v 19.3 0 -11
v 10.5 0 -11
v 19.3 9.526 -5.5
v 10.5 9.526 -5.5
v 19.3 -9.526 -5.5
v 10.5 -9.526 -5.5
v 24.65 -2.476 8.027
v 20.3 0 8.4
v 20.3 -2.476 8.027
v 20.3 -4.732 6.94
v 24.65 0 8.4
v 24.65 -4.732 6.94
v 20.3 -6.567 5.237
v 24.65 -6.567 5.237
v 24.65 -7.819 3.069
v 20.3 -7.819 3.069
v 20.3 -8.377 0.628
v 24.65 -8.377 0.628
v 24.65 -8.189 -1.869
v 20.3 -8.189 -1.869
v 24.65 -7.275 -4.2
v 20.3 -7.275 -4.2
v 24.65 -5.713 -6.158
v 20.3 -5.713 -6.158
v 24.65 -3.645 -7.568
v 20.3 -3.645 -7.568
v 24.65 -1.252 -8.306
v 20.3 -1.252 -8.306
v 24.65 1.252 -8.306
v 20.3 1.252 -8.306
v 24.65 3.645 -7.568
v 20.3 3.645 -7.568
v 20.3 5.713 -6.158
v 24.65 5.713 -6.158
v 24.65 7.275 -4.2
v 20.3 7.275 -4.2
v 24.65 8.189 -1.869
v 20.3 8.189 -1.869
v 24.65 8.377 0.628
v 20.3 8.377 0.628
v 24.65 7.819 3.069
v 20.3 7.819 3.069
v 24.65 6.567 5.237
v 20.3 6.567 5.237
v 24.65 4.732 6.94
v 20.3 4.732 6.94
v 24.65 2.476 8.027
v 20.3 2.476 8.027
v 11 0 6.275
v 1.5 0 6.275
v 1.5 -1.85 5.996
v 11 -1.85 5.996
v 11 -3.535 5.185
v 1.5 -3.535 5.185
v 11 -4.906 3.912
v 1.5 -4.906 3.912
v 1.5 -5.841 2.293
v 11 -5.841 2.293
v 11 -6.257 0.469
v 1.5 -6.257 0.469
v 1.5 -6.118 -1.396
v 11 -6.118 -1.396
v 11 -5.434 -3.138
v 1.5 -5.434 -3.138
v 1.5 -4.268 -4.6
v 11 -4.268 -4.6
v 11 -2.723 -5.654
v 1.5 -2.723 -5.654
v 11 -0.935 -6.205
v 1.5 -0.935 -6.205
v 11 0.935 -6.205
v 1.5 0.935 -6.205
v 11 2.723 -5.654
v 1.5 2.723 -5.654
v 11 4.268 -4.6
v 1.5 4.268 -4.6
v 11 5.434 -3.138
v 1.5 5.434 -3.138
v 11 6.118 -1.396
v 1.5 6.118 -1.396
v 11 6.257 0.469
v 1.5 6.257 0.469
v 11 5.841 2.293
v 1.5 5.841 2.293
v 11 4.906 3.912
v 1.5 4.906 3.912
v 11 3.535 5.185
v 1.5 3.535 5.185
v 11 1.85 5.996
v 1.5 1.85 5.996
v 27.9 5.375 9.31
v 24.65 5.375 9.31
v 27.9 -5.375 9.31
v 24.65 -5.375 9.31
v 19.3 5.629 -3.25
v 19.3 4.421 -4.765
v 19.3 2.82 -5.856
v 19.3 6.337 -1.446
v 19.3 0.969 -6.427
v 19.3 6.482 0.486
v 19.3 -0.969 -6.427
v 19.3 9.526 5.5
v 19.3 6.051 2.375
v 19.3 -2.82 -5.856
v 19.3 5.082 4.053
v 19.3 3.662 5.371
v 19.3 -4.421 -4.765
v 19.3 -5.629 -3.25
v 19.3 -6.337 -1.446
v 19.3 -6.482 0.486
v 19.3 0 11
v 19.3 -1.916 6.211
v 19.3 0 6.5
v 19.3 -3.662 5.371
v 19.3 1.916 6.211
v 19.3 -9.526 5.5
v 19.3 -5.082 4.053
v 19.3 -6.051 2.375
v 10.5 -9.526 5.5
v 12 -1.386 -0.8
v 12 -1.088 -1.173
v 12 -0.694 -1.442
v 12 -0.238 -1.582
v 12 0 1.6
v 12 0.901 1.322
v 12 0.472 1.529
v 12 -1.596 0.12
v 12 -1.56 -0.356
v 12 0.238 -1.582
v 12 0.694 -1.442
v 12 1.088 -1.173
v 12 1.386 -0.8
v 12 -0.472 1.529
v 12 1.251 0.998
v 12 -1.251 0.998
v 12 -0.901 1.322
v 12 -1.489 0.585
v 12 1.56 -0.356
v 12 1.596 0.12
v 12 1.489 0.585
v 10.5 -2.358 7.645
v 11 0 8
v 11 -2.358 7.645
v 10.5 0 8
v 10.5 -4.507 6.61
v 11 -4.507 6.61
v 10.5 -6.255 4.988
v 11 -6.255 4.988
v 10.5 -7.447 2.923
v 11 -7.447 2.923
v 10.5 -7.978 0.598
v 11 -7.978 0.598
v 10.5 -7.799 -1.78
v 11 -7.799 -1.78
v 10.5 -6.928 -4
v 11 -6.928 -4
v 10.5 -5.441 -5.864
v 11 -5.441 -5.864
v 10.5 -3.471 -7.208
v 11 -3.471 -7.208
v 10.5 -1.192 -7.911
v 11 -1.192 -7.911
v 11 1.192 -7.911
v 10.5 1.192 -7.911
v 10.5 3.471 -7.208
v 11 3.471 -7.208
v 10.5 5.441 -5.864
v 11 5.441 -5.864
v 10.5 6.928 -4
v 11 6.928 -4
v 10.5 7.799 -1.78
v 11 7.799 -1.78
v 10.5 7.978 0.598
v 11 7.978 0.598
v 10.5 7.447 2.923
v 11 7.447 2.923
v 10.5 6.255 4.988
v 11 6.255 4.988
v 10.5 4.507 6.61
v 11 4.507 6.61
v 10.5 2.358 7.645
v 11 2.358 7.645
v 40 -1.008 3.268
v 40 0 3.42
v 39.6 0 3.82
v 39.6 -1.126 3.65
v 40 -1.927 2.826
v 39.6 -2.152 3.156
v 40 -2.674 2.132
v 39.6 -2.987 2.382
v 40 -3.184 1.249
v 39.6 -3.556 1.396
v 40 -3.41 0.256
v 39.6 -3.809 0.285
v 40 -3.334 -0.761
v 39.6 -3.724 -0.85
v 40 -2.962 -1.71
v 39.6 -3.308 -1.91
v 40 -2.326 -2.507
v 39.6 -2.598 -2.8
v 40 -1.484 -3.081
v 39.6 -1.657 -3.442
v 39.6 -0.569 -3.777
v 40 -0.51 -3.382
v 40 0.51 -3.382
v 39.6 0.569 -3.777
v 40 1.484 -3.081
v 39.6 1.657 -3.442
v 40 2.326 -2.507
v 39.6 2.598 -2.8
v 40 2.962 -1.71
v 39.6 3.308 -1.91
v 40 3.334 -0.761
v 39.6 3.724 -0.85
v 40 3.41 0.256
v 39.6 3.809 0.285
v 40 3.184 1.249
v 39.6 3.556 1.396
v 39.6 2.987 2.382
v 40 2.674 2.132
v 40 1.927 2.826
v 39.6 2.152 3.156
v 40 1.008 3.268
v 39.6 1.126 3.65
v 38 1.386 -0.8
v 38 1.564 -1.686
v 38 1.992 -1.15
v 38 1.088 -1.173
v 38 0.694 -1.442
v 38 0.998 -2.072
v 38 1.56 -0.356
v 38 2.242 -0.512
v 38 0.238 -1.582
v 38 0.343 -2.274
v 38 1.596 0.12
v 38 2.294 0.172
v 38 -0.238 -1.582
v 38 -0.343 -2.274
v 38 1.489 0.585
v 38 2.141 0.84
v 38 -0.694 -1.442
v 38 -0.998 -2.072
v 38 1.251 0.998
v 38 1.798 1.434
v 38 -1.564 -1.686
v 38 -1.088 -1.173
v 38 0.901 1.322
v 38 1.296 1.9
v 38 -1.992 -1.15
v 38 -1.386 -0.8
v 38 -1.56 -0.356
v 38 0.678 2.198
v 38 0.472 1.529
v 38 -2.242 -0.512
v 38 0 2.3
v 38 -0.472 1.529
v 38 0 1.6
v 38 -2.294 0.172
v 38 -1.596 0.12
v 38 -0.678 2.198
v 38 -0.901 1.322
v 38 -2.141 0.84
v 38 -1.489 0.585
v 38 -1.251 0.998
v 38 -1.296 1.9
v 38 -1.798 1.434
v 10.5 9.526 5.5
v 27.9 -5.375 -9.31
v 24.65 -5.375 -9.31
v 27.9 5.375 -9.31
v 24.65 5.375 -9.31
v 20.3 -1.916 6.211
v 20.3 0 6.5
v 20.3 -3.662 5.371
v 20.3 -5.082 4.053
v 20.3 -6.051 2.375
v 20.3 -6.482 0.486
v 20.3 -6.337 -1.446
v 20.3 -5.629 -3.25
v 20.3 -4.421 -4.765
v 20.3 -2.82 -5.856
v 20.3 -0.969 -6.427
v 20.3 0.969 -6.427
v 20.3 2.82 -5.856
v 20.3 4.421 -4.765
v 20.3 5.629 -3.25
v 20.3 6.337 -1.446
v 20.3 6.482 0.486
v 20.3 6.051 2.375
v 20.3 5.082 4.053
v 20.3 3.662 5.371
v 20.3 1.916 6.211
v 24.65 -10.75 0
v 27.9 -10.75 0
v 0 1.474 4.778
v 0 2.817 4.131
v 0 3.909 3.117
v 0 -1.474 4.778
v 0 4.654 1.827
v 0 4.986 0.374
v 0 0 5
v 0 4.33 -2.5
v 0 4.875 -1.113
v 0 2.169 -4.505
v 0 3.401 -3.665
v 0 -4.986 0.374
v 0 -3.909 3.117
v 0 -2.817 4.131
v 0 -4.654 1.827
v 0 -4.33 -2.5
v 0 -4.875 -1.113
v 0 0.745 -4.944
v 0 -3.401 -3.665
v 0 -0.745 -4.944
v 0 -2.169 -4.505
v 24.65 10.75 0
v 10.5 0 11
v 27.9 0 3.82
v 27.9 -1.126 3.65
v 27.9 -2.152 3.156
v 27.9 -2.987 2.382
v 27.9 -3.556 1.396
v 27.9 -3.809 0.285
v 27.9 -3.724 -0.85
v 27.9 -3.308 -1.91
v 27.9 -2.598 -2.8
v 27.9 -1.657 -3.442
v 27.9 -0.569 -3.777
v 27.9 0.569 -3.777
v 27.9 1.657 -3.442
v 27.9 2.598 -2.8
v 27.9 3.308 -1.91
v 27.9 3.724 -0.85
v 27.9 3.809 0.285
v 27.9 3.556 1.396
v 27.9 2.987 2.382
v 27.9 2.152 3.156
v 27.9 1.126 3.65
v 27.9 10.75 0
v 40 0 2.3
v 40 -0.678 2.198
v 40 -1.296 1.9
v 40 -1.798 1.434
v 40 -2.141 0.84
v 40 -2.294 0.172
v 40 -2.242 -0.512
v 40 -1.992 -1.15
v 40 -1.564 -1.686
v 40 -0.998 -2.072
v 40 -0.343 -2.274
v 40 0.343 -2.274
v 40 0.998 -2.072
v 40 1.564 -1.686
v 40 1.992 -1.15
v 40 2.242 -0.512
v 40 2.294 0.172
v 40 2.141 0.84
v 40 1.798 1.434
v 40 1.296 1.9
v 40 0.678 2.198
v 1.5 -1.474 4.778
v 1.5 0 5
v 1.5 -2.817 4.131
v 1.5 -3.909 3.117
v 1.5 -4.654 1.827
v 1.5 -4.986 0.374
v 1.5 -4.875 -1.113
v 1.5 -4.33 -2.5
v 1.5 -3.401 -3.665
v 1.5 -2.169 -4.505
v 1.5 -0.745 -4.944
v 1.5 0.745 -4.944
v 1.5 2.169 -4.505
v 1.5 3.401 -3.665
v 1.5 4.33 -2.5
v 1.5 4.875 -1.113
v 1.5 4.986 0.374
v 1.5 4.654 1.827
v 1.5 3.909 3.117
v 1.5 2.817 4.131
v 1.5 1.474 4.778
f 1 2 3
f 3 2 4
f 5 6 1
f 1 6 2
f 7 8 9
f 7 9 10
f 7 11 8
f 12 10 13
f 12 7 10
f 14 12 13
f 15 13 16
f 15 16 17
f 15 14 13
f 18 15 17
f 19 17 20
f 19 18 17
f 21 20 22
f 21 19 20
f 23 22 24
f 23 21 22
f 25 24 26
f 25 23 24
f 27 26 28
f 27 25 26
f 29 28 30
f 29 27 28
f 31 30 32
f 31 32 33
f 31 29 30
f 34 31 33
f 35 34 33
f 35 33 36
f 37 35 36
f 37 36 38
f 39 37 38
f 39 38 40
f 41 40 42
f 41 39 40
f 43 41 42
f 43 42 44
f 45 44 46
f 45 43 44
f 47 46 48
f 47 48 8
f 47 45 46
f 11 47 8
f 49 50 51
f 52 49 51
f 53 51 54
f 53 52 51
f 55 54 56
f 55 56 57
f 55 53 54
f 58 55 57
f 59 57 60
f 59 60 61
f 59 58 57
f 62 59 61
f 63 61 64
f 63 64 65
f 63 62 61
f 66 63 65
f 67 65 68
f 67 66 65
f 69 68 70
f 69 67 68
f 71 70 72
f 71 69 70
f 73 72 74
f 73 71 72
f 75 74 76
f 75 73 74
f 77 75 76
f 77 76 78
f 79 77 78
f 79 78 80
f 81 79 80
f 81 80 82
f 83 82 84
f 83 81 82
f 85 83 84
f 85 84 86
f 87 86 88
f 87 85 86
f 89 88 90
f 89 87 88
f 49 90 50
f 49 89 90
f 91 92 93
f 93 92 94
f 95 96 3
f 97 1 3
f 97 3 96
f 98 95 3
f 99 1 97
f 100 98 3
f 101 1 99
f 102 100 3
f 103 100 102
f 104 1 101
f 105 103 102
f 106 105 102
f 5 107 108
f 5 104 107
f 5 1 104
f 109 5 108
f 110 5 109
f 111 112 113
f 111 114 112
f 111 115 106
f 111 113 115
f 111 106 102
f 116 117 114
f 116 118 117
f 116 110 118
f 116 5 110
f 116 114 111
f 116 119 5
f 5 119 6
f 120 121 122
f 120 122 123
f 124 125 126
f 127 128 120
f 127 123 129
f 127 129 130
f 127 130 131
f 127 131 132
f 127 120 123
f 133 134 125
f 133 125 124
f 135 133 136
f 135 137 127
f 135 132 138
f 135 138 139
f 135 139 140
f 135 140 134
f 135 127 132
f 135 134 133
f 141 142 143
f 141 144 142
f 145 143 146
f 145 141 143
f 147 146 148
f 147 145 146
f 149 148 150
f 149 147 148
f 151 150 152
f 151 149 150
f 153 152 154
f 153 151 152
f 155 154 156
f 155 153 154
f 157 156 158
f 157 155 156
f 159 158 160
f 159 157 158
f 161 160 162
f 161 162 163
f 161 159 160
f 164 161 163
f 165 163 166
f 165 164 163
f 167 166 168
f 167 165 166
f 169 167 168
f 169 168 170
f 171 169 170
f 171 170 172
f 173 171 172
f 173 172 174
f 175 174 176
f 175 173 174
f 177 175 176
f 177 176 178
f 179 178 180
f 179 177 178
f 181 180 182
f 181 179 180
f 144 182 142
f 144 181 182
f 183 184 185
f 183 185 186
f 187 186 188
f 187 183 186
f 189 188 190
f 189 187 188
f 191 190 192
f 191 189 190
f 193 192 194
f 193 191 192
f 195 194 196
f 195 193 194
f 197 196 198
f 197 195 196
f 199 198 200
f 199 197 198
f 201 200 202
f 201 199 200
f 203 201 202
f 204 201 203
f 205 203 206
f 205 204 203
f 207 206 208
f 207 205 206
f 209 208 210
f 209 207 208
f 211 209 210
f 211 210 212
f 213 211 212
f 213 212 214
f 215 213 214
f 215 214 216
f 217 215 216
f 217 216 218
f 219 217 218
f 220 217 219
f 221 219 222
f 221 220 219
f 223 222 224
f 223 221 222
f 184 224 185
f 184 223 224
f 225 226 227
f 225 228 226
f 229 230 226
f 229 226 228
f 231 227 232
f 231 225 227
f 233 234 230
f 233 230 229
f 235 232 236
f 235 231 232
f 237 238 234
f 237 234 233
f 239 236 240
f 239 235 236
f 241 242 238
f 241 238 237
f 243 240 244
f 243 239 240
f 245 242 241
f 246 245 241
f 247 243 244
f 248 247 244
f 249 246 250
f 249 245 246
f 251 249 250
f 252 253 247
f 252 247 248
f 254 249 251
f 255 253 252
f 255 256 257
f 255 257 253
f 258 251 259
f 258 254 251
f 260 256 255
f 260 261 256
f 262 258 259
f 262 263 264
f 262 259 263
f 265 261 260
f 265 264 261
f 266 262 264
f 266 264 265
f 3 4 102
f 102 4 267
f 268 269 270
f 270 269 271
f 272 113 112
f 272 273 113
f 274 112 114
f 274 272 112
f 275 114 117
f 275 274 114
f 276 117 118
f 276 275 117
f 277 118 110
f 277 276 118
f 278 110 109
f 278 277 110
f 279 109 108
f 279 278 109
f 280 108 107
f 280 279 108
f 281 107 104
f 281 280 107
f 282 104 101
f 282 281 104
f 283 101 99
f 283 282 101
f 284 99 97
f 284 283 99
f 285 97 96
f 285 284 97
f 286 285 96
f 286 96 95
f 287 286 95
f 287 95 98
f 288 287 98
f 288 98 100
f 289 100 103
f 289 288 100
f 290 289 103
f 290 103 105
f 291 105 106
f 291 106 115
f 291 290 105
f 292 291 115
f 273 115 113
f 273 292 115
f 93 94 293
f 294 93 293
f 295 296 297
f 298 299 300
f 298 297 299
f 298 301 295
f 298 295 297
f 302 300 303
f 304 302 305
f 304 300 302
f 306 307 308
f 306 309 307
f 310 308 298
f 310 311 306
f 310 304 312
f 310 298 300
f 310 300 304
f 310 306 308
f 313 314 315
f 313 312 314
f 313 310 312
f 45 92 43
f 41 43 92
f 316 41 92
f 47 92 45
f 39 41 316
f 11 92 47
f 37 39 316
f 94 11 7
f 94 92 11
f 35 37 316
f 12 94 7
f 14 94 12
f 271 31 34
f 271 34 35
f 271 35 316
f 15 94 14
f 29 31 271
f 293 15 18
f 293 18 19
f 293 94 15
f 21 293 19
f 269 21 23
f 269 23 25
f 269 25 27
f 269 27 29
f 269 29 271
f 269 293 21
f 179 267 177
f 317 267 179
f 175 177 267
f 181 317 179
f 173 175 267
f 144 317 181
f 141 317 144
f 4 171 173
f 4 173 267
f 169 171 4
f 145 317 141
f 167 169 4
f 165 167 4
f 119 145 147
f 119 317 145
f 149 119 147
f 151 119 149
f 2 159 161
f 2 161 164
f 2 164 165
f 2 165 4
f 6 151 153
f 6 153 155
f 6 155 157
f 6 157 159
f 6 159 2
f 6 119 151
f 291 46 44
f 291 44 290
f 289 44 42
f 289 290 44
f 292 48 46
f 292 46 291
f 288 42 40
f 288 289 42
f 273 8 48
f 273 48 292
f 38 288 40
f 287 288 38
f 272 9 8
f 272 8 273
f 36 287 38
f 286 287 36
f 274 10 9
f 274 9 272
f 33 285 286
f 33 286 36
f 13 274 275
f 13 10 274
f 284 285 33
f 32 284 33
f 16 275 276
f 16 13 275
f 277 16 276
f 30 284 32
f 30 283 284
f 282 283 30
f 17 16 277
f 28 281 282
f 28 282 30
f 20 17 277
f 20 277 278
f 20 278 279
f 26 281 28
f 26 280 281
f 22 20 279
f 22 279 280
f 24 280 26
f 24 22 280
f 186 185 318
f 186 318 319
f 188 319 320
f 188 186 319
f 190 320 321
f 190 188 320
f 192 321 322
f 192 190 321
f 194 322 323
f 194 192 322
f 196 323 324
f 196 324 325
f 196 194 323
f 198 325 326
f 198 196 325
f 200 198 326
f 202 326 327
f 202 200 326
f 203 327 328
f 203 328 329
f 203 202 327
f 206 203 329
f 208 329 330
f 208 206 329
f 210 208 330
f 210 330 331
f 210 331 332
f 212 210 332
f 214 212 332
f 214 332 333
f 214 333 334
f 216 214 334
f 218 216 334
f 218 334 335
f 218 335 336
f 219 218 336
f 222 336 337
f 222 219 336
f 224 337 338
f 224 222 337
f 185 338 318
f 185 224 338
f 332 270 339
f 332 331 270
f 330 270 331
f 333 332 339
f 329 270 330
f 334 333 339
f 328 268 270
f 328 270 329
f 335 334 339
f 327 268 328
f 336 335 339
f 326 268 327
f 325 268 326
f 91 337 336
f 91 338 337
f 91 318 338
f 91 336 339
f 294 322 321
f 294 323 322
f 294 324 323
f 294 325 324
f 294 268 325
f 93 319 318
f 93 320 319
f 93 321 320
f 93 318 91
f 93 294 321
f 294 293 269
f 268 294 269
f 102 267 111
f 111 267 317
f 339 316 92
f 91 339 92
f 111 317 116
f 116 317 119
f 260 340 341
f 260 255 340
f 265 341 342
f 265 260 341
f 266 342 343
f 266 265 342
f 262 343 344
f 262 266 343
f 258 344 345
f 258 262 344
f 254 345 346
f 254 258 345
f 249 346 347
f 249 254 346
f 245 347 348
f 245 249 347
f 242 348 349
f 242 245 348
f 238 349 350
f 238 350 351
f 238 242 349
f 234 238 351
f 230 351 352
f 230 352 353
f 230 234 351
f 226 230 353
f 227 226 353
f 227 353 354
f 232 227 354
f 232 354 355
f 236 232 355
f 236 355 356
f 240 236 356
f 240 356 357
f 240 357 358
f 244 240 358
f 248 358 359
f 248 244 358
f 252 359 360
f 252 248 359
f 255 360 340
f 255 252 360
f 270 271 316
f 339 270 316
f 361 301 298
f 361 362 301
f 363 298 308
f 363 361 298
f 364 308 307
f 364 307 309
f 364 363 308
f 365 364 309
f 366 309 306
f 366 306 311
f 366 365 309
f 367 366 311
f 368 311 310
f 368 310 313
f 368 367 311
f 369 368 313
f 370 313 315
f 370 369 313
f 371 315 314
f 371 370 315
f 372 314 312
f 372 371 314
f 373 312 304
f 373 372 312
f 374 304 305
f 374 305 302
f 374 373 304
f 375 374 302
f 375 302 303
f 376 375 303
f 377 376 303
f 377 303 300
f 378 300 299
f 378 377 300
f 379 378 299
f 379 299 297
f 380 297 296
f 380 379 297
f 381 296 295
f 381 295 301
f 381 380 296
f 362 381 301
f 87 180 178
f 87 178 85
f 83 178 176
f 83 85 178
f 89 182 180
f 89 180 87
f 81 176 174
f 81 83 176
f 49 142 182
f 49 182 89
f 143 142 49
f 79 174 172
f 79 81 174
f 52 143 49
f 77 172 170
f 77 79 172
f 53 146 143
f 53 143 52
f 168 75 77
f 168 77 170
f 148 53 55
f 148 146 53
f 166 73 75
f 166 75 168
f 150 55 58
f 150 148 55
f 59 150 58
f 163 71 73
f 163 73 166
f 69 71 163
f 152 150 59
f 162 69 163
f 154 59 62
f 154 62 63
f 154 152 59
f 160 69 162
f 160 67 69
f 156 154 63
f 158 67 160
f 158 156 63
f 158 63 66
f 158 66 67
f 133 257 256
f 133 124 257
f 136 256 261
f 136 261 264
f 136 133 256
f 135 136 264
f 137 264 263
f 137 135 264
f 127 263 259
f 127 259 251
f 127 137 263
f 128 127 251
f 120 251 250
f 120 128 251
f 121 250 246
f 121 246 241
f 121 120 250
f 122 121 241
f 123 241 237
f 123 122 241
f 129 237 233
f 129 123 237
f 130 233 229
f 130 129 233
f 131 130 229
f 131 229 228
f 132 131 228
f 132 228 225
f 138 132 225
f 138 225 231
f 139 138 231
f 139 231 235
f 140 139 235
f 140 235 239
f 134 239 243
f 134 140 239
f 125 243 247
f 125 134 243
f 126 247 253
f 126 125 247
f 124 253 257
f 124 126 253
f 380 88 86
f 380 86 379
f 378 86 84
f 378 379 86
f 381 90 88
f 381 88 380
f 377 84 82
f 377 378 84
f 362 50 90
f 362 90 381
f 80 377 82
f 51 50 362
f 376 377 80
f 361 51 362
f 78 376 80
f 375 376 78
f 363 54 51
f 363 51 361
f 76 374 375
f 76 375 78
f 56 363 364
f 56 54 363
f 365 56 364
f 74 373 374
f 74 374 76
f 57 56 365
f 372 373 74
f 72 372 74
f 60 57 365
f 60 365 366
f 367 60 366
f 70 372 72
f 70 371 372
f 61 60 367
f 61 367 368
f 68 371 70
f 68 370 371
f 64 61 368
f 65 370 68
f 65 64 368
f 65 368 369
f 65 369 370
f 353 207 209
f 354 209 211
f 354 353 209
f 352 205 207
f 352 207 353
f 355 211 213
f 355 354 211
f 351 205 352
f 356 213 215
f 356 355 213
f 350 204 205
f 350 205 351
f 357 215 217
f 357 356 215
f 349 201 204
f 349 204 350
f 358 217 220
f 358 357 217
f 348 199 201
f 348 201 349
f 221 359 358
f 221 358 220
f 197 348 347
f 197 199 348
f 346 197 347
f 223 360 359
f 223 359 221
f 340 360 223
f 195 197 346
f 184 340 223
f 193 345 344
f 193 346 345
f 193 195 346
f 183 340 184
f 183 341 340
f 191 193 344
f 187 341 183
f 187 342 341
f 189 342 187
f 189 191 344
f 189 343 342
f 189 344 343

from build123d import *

# Parameters (mm, degrees)
CHAMFER1_SIZE  = 0.4
EXTRUDE1_START = -3.25
SKETCH2_R      = 11.925743973
EXTRUDE1_DEPTH = 3.25
EXTRUDE2_START = -8.8
SKETCH3_R      = 13.491172398
EXTRUDE2_DEPTH = 8.8


with BuildPart() as part:
    # Sketch1 → Revolve1 (revolve)
    with BuildSketch(Plane.XY, mode=Mode.PRIVATE) as revolve1_sk:
        Polygon((0, 0), (0, 5), (1.5, 5), (1.5, 6.275), (11, 6.275), (11, 8), (10.5, 8), (10.5, 11), (19.3, 11), (19.3, 6.5), (20.3, 6.5), (20.3, 8.4), (24.65, 8.4), (24.65, 10.75), (27.9, 10.75), (27.9, 3.82), (40, 3.82), (40, 2.3), (38, 2.3), (38, 1.6), (12, 1.6), (12, 0), align=None)
    revolve(revolve1_sk.sketch.rotate(Axis((0, 0, 0), (1, 0, 0)), 90), axis=Axis((0, 0, 0), (1, 0, 0)))

    # Chamfer1
    chamfer1_edges = [part.edges().sort_by_distance(p)[0] for p in [
        (40, 0, -3.82),
    ]]
    chamfer(chamfer1_edges, length=CHAMFER1_SIZE)

    # Sketch2 → Extrude1 (cut)
    with BuildSketch(Plane(origin=(27.9, 0, 0), x_dir=(0, 0, -1), z_dir=(1, 0, 0)).offset(EXTRUDE1_START)):
        Circle(SKETCH2_R)
        Polygon((0, 10.75), (-9.309773091, 5.375), (-9.309773091, -5.375), (0, -10.75), (9.309773091, -5.375), (9.309773091, 5.375), align=None, mode=Mode.SUBTRACT)
    extrude(amount=EXTRUDE1_DEPTH, mode=Mode.SUBTRACT)

    # Sketch3 → Extrude2 (cut)
    with BuildSketch(Plane(origin=(19.3, 0, 0), x_dir=(0, 0, -1), z_dir=(1, 0, 0)).offset(EXTRUDE2_START)):
        Circle(SKETCH3_R)
        Polygon((-5.5, 9.526279442), (-11, 0), (-5.5, -9.526279442), (5.5, -9.526279442), (11, 0), (5.5, 9.526279442), align=None, mode=Mode.SUBTRACT)
    extrude(amount=EXTRUDE2_DEPTH, mode=Mode.SUBTRACT)


solid = part.part
